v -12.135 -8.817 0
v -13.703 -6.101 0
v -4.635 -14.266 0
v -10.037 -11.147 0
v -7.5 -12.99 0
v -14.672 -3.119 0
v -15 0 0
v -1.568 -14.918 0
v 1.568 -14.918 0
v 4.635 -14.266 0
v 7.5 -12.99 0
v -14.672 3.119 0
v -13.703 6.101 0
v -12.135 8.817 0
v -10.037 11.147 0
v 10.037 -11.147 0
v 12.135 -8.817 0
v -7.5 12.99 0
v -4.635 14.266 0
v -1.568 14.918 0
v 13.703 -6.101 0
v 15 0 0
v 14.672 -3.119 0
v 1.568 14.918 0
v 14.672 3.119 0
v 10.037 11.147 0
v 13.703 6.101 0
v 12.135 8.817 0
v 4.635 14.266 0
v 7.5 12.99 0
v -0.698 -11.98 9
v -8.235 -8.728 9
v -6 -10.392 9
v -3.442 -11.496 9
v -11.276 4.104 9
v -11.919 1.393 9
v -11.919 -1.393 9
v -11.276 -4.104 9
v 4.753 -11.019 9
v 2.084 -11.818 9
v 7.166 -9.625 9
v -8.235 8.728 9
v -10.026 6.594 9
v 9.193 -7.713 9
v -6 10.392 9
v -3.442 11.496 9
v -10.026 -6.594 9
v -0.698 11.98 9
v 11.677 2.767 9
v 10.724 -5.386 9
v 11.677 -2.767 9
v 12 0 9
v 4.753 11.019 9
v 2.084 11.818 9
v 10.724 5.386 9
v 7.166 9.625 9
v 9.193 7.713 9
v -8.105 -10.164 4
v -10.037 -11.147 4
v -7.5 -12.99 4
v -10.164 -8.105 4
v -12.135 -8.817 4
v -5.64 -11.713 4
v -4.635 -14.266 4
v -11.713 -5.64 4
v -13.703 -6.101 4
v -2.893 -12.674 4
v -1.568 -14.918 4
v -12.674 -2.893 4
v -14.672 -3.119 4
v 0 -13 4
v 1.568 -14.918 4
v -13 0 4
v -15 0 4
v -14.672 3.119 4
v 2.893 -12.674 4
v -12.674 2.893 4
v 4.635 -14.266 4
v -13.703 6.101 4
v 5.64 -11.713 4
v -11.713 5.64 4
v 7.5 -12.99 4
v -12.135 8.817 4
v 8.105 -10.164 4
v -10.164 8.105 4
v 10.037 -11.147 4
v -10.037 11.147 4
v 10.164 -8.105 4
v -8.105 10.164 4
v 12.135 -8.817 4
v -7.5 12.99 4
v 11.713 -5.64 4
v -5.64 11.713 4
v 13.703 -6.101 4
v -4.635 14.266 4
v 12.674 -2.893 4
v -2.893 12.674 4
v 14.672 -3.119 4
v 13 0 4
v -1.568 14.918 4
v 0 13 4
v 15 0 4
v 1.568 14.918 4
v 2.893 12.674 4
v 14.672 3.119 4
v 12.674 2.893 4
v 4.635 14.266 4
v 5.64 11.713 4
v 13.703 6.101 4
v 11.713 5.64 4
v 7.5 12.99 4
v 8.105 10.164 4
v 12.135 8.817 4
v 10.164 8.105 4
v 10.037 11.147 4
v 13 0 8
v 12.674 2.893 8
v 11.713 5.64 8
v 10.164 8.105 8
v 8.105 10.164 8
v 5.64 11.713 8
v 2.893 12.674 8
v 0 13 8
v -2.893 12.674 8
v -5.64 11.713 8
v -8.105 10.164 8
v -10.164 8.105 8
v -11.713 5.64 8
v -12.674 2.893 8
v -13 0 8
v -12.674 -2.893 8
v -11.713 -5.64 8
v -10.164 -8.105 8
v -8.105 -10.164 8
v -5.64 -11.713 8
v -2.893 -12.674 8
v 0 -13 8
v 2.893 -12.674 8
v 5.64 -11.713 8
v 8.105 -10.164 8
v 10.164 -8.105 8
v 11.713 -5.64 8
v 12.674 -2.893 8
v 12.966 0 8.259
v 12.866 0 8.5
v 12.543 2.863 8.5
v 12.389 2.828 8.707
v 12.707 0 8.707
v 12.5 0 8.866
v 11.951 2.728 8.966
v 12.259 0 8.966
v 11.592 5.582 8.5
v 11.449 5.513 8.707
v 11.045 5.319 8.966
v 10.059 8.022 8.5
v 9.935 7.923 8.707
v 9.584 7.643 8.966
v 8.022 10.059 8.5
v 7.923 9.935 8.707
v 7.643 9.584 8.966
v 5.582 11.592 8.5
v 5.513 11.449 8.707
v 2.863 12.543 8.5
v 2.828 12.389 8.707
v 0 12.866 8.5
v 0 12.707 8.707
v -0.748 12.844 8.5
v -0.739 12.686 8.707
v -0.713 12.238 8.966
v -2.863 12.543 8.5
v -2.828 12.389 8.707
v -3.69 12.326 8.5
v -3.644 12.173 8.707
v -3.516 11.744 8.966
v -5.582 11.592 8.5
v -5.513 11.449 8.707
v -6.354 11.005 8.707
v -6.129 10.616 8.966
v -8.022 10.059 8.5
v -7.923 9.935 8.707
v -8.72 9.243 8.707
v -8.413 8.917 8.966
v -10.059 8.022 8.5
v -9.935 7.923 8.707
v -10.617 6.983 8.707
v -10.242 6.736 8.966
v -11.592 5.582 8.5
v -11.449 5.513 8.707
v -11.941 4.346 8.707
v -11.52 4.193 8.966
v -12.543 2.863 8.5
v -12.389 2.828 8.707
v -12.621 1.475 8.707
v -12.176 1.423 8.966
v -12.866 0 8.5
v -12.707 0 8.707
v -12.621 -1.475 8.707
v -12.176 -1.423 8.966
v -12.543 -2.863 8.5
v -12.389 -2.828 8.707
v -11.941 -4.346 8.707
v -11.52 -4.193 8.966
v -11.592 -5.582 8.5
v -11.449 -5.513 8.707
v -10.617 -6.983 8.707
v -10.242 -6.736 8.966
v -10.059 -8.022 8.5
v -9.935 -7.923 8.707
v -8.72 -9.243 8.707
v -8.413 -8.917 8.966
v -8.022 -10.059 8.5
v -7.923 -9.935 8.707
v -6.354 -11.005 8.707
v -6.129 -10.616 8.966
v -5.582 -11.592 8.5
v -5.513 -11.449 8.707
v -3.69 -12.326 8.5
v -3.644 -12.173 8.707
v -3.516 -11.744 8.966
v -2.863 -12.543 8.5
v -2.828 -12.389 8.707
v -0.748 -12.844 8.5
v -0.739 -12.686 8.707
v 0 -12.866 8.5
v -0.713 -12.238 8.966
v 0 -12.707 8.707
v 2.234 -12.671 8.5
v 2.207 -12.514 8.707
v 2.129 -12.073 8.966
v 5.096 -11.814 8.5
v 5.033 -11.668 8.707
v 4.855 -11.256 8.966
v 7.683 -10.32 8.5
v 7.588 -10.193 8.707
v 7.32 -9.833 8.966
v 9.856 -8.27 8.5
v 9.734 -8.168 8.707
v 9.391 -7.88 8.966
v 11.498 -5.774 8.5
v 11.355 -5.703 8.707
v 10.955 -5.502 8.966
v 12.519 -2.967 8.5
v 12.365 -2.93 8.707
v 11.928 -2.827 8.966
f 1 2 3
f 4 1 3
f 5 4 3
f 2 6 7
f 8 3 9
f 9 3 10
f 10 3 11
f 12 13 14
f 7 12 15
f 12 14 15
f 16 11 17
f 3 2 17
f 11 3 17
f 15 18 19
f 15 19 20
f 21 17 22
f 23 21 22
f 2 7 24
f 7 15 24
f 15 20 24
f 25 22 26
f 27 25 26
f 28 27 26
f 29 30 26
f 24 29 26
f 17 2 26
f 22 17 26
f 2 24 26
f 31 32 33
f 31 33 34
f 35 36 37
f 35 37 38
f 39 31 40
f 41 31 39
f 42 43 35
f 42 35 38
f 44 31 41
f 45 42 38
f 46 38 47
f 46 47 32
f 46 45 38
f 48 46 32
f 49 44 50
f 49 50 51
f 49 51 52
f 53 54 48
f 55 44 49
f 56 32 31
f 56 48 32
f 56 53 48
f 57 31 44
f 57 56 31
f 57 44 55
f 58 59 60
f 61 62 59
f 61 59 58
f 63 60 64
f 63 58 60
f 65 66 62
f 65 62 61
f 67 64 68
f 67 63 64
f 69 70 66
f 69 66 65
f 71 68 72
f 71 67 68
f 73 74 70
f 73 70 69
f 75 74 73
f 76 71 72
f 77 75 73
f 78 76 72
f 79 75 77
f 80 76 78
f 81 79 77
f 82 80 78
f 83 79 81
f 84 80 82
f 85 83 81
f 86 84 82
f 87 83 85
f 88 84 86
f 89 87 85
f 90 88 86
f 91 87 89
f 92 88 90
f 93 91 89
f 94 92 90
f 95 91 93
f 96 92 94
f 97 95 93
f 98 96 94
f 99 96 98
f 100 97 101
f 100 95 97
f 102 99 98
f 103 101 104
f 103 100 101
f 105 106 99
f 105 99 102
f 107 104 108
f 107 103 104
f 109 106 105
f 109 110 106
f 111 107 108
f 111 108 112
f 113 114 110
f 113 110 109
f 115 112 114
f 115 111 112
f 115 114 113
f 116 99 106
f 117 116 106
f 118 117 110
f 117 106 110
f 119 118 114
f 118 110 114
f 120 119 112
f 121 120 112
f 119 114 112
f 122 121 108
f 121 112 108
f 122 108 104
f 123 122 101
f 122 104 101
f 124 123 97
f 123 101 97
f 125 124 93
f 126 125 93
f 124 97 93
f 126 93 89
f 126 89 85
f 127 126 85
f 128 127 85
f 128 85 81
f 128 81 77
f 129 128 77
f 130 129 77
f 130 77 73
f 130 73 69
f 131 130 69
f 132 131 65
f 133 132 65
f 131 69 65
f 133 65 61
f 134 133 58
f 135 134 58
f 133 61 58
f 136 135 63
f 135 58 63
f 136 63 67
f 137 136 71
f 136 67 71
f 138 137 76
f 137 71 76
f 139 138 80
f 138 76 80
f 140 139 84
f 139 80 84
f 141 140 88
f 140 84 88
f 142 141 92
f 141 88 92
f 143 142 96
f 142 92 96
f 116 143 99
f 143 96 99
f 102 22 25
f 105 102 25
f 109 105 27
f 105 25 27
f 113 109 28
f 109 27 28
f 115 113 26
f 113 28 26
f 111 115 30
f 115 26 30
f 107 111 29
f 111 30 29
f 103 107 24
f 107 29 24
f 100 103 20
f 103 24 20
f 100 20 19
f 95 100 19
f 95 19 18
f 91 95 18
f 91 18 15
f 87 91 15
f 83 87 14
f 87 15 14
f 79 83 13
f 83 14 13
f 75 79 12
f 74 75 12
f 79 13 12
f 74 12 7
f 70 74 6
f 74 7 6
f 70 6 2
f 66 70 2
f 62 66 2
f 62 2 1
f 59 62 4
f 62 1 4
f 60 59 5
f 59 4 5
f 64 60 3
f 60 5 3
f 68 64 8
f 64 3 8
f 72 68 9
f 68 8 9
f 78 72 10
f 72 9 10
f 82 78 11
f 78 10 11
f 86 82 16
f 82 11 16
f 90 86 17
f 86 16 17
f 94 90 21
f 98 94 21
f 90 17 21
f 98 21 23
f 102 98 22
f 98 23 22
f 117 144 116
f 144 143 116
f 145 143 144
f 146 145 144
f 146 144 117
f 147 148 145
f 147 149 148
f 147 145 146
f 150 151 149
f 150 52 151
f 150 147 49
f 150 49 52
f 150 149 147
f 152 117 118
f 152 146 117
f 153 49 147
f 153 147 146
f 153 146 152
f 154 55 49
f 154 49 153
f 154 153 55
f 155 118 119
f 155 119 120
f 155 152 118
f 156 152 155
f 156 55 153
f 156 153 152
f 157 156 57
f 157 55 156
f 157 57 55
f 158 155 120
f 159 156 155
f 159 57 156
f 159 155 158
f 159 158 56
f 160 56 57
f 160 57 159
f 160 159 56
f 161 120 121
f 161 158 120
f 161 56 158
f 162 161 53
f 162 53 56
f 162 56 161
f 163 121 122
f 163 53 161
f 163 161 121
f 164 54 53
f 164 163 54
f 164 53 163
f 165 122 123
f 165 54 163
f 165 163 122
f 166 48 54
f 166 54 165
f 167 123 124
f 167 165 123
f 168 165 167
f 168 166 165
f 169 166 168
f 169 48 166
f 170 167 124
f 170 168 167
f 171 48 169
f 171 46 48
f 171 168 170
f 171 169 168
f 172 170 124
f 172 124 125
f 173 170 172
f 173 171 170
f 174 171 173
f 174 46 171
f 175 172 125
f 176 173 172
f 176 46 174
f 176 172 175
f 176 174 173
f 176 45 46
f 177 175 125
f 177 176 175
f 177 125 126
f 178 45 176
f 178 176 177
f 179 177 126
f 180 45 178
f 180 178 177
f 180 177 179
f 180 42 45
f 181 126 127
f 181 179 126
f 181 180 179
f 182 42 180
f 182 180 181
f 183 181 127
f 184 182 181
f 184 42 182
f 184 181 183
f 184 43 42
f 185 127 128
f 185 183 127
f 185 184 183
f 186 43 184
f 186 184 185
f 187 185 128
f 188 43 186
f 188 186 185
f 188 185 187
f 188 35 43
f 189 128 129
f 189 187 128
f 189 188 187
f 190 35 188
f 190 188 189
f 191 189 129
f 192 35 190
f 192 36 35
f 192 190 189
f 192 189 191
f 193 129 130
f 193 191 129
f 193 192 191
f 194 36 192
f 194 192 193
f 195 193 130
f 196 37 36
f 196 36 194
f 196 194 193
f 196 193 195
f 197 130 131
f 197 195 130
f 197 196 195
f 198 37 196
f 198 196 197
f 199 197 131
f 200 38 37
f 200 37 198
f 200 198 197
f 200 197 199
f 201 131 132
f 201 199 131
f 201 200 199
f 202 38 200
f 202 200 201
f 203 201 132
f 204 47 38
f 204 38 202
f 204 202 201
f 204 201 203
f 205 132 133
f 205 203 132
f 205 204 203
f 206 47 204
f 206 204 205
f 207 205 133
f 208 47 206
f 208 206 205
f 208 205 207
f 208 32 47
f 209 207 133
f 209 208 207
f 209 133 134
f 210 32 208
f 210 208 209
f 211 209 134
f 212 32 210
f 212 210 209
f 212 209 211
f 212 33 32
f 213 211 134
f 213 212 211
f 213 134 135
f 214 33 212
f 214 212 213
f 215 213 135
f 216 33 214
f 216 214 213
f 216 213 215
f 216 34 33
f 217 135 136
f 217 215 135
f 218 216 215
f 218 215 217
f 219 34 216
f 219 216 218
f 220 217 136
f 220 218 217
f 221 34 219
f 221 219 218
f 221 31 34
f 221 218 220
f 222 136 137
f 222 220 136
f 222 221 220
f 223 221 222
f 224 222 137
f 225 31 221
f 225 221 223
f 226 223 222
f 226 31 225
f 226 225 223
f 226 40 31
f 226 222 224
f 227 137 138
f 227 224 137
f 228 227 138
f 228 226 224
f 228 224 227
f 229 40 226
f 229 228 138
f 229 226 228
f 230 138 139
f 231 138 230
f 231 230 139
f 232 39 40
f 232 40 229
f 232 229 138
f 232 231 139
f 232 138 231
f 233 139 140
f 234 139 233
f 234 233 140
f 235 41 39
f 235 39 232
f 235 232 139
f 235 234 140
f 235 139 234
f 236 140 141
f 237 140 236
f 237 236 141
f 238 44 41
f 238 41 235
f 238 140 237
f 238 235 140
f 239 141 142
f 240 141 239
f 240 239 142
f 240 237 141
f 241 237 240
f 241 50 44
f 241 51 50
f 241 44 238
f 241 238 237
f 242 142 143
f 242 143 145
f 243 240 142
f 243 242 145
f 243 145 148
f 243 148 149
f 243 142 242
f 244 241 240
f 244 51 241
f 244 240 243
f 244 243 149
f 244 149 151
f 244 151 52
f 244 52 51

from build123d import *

# Parameters (mm, degrees)
SKETCH_R     = 15
PAD_DEPTH    = 4
SKETCH001_R  = 13
PAD001_DEPTH = 5
FILLET_R     = 1


with BuildPart() as part:
    # Sketch → Pad (new body)
    with BuildSketch(Plane.XY):
        Circle(SKETCH_R)
    extrude(amount=PAD_DEPTH)

    # Sketch001 (on Face3 of Pad) → Pad001 (join)
    with BuildSketch(Plane.XY.offset(4)):
        Circle(SKETCH001_R)
    extrude(amount=PAD001_DEPTH)

    # Fillet
    fillet_edges = [part.edges().sort_by_distance(p)[0] for p in [
        (-13, 0, 9),
    ]]
    fillet(fillet_edges, radius=FILLET_R)


solid = part.part
